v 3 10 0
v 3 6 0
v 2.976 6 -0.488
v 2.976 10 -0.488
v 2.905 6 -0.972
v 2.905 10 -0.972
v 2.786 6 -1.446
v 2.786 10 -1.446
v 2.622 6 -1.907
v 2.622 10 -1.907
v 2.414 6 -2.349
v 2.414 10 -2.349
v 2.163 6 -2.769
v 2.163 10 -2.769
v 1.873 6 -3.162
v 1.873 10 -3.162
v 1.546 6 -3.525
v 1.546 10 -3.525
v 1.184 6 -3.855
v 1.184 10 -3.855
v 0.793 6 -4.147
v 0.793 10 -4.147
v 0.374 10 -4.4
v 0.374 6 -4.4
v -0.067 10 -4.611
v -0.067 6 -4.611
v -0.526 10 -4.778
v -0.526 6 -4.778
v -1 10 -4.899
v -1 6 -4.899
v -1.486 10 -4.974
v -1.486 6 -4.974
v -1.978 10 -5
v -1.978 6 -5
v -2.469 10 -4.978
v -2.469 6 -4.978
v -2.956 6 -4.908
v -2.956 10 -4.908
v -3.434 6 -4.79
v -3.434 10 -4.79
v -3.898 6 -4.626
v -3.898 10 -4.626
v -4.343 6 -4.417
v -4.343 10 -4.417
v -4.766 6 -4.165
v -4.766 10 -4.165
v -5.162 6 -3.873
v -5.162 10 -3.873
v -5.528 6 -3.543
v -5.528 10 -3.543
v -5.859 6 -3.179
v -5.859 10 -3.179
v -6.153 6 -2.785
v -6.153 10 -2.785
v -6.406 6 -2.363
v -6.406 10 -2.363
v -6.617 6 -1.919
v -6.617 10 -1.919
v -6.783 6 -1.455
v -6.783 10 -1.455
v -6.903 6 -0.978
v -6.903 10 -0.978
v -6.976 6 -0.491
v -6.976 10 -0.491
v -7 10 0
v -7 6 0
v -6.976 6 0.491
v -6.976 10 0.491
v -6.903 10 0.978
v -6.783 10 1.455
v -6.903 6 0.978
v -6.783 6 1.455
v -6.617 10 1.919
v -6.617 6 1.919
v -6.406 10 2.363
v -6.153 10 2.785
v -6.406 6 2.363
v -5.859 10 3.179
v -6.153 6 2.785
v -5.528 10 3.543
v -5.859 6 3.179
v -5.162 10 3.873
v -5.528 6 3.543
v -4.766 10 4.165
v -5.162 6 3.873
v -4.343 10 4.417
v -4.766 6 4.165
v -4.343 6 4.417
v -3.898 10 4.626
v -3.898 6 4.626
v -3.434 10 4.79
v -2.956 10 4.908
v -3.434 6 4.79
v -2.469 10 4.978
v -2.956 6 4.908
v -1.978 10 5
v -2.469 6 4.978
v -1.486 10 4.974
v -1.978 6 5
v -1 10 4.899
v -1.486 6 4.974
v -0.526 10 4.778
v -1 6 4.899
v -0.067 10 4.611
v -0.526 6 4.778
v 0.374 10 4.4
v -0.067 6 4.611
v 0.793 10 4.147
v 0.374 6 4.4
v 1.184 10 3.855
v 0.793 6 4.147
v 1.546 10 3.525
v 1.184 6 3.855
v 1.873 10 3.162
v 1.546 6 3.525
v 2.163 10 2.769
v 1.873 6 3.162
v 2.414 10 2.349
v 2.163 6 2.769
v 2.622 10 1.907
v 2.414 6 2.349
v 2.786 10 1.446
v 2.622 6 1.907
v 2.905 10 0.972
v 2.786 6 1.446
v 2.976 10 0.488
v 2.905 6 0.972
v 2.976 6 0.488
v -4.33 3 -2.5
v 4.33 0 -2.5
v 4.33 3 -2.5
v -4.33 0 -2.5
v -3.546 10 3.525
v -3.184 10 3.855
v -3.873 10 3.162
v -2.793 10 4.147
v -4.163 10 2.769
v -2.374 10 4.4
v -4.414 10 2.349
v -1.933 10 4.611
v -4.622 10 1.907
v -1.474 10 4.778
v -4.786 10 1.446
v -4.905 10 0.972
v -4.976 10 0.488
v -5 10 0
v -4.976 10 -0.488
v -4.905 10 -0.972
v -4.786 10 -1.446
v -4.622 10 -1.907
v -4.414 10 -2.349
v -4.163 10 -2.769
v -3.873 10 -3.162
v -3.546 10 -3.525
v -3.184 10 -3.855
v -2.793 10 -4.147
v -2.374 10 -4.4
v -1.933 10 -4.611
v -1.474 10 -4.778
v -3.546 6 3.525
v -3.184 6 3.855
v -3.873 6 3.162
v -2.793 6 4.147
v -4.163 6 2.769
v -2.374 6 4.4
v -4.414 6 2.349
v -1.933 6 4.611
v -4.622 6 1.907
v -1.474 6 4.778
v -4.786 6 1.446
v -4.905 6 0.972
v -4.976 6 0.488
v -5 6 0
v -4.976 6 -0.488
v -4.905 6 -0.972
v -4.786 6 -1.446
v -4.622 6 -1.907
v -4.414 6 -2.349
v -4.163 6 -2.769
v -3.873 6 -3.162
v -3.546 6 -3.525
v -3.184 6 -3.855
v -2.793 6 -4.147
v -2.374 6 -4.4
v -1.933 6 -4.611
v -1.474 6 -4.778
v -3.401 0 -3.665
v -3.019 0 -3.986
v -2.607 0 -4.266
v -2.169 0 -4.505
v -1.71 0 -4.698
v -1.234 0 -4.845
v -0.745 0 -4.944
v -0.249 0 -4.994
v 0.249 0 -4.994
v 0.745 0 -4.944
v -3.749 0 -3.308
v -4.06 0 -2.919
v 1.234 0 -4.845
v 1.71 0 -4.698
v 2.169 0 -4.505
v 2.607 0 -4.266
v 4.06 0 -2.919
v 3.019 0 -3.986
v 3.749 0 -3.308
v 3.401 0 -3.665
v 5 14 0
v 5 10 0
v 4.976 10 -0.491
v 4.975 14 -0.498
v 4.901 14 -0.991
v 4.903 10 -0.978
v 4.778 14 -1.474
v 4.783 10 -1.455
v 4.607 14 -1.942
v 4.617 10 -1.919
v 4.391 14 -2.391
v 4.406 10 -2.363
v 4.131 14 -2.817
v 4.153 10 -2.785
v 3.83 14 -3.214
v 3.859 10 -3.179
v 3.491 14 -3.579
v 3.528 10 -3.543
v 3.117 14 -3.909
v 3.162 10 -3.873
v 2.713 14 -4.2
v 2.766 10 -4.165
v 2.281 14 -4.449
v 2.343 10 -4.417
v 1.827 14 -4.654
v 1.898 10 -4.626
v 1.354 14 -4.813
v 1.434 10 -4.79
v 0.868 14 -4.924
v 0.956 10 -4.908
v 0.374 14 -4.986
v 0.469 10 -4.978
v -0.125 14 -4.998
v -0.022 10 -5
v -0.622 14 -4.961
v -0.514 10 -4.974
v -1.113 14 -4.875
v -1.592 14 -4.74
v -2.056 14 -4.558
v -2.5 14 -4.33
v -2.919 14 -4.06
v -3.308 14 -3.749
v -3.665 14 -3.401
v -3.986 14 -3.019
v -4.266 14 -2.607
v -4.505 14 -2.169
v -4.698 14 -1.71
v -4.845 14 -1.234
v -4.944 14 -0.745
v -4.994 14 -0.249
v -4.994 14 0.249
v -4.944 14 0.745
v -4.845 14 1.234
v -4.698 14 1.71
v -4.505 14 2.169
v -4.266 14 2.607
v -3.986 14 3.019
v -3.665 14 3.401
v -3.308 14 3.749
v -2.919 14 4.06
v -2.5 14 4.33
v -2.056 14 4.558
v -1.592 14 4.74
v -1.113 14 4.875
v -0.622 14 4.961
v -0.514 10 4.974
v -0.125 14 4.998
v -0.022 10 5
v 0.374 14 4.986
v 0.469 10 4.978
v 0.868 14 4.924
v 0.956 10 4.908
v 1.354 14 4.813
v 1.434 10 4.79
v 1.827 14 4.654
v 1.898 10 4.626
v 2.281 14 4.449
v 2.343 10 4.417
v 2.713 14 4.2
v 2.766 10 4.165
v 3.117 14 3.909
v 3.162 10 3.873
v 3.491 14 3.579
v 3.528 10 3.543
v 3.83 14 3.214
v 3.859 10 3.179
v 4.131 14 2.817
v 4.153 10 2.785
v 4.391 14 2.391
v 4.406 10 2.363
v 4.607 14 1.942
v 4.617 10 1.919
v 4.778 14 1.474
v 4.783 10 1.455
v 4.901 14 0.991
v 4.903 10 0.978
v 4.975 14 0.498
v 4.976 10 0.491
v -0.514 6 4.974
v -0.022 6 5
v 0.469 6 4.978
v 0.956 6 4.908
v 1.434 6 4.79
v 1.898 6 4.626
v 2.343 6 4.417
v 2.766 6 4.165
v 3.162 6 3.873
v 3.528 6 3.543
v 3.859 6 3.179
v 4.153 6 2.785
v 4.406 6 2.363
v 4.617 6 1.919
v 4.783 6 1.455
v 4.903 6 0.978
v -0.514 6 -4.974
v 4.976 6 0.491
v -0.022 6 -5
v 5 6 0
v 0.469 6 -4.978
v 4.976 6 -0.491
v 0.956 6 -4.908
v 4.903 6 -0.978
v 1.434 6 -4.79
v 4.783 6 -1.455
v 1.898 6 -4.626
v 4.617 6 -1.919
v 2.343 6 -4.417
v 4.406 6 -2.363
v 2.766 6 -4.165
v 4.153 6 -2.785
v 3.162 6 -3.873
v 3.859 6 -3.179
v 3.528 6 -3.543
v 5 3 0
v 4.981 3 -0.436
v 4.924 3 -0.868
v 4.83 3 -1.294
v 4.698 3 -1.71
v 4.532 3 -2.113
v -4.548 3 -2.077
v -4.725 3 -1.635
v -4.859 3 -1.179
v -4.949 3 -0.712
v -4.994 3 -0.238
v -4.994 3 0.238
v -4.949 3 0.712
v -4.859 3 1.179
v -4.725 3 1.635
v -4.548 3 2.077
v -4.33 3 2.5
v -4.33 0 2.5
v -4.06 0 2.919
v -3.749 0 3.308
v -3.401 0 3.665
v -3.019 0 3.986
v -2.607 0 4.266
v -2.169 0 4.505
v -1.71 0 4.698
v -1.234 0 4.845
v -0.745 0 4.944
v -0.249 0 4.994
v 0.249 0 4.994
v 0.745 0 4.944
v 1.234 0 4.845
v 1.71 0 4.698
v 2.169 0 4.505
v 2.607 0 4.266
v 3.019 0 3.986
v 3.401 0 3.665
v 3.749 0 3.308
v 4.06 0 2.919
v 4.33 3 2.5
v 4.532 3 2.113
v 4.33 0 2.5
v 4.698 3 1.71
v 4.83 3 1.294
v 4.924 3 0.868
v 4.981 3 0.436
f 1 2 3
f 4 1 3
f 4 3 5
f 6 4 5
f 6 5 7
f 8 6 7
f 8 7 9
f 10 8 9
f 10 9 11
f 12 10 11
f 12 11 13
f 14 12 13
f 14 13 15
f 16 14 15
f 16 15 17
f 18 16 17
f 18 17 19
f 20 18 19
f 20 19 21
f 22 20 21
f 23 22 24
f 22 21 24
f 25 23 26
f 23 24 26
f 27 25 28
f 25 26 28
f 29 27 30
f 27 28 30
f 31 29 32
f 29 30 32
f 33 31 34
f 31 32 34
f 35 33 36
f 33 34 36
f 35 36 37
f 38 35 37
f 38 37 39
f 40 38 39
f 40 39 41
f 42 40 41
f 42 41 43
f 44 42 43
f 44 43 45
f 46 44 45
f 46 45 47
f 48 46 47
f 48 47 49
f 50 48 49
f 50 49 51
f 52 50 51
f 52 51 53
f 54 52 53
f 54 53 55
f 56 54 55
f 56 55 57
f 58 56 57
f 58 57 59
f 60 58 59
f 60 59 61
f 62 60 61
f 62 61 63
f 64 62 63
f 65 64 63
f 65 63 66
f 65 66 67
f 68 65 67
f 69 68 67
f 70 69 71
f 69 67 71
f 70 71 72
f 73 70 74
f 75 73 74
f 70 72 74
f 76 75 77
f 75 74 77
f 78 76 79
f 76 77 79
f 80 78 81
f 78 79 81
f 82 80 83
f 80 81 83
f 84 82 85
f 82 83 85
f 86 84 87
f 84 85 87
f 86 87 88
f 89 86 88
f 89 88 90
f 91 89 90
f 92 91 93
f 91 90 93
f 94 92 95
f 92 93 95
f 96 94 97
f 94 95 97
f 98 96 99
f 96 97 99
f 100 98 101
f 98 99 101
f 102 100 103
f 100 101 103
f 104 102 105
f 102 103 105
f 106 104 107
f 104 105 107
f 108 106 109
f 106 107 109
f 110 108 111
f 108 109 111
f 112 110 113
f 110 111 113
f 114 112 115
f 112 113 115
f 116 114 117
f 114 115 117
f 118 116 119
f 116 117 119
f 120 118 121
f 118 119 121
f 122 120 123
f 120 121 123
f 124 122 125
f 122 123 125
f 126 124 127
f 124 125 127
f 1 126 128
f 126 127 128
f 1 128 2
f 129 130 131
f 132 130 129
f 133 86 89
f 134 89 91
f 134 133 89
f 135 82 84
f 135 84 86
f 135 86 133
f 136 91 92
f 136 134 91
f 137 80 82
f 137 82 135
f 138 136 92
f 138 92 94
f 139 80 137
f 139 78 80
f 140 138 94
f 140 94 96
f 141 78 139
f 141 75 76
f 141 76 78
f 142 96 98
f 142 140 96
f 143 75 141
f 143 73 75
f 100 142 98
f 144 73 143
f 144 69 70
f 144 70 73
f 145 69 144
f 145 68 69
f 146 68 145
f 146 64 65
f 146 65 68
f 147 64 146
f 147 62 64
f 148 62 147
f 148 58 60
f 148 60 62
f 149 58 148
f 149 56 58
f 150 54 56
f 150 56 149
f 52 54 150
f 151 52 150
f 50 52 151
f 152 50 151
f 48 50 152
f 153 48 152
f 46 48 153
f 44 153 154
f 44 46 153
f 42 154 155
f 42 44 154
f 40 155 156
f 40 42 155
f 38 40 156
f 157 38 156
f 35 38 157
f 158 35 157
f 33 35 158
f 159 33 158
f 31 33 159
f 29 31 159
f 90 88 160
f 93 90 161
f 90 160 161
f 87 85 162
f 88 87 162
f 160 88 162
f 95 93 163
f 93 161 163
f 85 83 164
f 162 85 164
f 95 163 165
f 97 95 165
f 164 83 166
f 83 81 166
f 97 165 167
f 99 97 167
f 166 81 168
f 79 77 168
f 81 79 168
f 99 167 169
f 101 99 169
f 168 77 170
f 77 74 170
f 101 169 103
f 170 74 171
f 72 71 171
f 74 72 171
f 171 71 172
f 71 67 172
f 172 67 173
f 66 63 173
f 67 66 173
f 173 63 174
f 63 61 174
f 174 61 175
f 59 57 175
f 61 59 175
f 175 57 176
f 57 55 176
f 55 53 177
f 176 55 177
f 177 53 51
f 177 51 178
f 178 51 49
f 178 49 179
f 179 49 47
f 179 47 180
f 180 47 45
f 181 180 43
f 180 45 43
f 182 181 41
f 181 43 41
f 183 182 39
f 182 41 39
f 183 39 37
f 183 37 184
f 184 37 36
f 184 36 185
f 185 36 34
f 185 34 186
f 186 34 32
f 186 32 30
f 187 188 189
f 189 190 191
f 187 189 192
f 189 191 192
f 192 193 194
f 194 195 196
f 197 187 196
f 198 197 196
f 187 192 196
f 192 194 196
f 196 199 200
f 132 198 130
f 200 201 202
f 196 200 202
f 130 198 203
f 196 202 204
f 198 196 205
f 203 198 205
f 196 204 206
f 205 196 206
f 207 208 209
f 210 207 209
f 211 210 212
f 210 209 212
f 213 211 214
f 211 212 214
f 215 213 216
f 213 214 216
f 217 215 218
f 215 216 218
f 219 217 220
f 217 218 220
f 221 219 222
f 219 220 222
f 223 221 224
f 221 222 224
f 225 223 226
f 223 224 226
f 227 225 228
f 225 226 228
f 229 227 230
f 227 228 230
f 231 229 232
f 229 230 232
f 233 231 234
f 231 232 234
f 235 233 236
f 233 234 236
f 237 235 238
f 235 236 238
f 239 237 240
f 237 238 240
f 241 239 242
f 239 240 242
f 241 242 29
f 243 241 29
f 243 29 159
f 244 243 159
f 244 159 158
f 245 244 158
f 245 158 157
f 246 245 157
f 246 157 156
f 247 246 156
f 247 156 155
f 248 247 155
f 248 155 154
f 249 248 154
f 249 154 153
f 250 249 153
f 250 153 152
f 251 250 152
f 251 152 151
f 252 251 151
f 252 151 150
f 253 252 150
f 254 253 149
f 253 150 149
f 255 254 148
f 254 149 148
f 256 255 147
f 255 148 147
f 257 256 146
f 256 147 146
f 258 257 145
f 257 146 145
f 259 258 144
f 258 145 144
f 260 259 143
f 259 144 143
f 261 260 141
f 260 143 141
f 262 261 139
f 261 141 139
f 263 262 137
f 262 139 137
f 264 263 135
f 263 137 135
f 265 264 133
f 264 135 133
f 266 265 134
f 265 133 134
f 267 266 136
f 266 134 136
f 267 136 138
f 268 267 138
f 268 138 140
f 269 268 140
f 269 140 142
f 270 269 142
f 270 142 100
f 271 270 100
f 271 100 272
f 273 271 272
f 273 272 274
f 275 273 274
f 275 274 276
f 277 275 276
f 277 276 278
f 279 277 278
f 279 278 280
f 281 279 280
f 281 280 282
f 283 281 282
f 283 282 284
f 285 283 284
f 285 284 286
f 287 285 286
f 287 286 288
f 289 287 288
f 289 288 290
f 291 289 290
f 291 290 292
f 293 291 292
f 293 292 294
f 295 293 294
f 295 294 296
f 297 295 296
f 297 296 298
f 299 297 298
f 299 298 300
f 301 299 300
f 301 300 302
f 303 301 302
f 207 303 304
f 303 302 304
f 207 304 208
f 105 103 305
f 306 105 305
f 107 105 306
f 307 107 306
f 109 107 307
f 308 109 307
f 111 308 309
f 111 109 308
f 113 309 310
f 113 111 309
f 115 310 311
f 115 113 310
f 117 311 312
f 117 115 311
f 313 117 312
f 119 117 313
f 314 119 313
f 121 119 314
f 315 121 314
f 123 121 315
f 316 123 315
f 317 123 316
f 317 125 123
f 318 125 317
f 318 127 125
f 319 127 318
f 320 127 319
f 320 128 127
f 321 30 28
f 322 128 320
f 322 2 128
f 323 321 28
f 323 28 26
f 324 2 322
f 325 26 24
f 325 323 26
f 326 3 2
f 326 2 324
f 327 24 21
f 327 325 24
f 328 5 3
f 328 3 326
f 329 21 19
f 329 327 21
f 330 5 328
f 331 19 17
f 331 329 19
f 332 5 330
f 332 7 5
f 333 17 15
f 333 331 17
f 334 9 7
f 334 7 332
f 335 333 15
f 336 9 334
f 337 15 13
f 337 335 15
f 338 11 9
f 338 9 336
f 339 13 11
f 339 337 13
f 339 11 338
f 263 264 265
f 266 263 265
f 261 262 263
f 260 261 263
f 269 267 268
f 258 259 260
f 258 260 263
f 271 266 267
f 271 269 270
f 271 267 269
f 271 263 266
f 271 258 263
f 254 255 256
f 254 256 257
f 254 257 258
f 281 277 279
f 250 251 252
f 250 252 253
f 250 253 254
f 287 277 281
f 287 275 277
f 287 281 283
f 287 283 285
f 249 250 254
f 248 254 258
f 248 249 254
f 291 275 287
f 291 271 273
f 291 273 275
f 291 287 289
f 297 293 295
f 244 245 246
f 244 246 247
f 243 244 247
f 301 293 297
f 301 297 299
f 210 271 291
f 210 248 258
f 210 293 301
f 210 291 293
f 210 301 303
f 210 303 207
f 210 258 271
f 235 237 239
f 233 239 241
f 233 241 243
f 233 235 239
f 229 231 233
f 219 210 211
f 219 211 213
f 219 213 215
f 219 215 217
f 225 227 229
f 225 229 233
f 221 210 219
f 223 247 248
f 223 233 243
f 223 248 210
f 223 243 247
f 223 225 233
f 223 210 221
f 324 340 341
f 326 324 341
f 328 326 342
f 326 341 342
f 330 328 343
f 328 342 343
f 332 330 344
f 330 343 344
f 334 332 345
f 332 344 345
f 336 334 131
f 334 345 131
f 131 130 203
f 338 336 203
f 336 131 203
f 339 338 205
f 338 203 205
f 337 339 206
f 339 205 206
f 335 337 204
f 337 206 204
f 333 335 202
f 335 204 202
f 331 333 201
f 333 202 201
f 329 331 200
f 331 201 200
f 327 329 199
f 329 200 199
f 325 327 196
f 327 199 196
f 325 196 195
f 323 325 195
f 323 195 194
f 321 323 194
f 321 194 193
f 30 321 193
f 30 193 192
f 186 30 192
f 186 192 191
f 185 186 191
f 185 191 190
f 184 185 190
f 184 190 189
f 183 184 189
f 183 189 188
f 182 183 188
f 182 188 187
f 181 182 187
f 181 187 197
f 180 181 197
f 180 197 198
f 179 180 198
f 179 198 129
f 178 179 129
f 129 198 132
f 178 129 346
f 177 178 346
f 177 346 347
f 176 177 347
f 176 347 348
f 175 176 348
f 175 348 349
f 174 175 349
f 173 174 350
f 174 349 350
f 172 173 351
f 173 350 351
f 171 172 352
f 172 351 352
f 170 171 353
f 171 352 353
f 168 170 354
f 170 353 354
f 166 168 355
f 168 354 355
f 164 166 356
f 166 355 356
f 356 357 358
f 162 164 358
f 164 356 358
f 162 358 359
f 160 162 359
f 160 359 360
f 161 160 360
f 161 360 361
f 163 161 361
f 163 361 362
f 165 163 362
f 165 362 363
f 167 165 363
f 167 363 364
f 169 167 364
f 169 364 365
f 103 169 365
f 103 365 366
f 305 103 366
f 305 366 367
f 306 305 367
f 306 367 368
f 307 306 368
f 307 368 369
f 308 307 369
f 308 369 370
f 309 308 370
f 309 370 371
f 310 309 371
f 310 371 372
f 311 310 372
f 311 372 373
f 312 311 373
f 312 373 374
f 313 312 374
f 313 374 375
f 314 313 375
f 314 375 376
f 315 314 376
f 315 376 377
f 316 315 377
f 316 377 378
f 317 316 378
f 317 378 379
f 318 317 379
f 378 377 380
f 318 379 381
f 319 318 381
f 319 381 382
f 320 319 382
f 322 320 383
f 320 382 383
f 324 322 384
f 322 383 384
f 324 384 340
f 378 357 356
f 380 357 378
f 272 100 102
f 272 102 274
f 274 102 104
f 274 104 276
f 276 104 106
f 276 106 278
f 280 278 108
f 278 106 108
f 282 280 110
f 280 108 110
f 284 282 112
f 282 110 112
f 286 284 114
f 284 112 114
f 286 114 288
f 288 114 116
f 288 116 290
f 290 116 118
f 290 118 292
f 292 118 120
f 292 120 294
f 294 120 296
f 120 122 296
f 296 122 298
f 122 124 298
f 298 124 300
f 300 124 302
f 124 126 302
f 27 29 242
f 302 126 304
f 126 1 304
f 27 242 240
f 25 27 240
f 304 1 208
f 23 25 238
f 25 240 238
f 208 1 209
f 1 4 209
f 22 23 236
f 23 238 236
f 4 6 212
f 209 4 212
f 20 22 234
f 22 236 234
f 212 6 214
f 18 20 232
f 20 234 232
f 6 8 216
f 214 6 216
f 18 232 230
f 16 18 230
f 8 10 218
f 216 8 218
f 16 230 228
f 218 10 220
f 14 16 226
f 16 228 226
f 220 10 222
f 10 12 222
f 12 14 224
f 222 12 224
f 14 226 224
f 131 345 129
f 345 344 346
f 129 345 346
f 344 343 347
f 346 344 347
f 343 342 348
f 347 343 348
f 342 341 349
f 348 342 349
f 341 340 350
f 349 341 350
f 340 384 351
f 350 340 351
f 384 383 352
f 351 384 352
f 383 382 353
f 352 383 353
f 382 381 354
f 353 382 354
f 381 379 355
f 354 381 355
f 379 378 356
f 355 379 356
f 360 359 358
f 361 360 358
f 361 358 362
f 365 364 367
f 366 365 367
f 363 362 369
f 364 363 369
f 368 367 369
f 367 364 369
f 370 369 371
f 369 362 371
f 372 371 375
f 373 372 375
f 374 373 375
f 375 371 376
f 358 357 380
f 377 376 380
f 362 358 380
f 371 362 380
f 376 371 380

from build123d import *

# Parameters (mm, degrees)
SKETCH_1_R          = 5
EXTRUDE_1_DEPTH     = 6
EXTRUDE_START       = 6
SKETCH_1_3_R        = 5
EXTRUDE_2_DEPTH     = 4
EXTRUDE_START_2     = 10
SKETCH_1_4_R        = 5
EXTRUDE_3_DEPTH     = 4
CUT_EXTRUDE_1_DEPTH = 3


with BuildPart() as part:
    # 草图1 → 凸台-拉伸1 (new body)
    with BuildSketch(Plane(origin=(0, 0, 0), x_dir=(1, 0, 0), z_dir=(0, 1, 0))):
        Circle(SKETCH_1_R)
    extrude(amount=EXTRUDE_1_DEPTH)

    # 草图1<3> → 凸台-拉伸2 (add)
    with BuildSketch(Plane(origin=(0, 0, 0), x_dir=(1, 0, 0), z_dir=(0, 1, 0)).offset(EXTRUDE_START)):
        with Locations((-2, 0)):
            Circle(SKETCH_1_3_R)
    extrude(amount=EXTRUDE_2_DEPTH)

    # 草图1<4> → 凸台-拉伸3 (add)
    with BuildSketch(Plane(origin=(0, 0, 0), x_dir=(1, 0, 0), z_dir=(0, 1, 0)).offset(EXTRUDE_START_2)):
        Circle(SKETCH_1_4_R)
    extrude(amount=EXTRUDE_3_DEPTH)

    # 草图2 → 切除-拉伸1 (cut)
    with BuildSketch(Plane.XZ):
        with BuildLine():
            Line((-4.330127019, 2.5), (4.330127019, 2.5))
            ThreePointArc((4.330127019, 2.5), (5, 0), (4.330127019, -2.5))
            Line((4.330127019, -2.5), (-4.330127019, -2.5))
            ThreePointArc((-4.330127019, -2.5), (-5, 0), (-4.330127019, 2.5))
        make_face()
    extrude(amount=-CUT_EXTRUDE_1_DEPTH, mode=Mode.SUBTRACT)


solid = part.part
